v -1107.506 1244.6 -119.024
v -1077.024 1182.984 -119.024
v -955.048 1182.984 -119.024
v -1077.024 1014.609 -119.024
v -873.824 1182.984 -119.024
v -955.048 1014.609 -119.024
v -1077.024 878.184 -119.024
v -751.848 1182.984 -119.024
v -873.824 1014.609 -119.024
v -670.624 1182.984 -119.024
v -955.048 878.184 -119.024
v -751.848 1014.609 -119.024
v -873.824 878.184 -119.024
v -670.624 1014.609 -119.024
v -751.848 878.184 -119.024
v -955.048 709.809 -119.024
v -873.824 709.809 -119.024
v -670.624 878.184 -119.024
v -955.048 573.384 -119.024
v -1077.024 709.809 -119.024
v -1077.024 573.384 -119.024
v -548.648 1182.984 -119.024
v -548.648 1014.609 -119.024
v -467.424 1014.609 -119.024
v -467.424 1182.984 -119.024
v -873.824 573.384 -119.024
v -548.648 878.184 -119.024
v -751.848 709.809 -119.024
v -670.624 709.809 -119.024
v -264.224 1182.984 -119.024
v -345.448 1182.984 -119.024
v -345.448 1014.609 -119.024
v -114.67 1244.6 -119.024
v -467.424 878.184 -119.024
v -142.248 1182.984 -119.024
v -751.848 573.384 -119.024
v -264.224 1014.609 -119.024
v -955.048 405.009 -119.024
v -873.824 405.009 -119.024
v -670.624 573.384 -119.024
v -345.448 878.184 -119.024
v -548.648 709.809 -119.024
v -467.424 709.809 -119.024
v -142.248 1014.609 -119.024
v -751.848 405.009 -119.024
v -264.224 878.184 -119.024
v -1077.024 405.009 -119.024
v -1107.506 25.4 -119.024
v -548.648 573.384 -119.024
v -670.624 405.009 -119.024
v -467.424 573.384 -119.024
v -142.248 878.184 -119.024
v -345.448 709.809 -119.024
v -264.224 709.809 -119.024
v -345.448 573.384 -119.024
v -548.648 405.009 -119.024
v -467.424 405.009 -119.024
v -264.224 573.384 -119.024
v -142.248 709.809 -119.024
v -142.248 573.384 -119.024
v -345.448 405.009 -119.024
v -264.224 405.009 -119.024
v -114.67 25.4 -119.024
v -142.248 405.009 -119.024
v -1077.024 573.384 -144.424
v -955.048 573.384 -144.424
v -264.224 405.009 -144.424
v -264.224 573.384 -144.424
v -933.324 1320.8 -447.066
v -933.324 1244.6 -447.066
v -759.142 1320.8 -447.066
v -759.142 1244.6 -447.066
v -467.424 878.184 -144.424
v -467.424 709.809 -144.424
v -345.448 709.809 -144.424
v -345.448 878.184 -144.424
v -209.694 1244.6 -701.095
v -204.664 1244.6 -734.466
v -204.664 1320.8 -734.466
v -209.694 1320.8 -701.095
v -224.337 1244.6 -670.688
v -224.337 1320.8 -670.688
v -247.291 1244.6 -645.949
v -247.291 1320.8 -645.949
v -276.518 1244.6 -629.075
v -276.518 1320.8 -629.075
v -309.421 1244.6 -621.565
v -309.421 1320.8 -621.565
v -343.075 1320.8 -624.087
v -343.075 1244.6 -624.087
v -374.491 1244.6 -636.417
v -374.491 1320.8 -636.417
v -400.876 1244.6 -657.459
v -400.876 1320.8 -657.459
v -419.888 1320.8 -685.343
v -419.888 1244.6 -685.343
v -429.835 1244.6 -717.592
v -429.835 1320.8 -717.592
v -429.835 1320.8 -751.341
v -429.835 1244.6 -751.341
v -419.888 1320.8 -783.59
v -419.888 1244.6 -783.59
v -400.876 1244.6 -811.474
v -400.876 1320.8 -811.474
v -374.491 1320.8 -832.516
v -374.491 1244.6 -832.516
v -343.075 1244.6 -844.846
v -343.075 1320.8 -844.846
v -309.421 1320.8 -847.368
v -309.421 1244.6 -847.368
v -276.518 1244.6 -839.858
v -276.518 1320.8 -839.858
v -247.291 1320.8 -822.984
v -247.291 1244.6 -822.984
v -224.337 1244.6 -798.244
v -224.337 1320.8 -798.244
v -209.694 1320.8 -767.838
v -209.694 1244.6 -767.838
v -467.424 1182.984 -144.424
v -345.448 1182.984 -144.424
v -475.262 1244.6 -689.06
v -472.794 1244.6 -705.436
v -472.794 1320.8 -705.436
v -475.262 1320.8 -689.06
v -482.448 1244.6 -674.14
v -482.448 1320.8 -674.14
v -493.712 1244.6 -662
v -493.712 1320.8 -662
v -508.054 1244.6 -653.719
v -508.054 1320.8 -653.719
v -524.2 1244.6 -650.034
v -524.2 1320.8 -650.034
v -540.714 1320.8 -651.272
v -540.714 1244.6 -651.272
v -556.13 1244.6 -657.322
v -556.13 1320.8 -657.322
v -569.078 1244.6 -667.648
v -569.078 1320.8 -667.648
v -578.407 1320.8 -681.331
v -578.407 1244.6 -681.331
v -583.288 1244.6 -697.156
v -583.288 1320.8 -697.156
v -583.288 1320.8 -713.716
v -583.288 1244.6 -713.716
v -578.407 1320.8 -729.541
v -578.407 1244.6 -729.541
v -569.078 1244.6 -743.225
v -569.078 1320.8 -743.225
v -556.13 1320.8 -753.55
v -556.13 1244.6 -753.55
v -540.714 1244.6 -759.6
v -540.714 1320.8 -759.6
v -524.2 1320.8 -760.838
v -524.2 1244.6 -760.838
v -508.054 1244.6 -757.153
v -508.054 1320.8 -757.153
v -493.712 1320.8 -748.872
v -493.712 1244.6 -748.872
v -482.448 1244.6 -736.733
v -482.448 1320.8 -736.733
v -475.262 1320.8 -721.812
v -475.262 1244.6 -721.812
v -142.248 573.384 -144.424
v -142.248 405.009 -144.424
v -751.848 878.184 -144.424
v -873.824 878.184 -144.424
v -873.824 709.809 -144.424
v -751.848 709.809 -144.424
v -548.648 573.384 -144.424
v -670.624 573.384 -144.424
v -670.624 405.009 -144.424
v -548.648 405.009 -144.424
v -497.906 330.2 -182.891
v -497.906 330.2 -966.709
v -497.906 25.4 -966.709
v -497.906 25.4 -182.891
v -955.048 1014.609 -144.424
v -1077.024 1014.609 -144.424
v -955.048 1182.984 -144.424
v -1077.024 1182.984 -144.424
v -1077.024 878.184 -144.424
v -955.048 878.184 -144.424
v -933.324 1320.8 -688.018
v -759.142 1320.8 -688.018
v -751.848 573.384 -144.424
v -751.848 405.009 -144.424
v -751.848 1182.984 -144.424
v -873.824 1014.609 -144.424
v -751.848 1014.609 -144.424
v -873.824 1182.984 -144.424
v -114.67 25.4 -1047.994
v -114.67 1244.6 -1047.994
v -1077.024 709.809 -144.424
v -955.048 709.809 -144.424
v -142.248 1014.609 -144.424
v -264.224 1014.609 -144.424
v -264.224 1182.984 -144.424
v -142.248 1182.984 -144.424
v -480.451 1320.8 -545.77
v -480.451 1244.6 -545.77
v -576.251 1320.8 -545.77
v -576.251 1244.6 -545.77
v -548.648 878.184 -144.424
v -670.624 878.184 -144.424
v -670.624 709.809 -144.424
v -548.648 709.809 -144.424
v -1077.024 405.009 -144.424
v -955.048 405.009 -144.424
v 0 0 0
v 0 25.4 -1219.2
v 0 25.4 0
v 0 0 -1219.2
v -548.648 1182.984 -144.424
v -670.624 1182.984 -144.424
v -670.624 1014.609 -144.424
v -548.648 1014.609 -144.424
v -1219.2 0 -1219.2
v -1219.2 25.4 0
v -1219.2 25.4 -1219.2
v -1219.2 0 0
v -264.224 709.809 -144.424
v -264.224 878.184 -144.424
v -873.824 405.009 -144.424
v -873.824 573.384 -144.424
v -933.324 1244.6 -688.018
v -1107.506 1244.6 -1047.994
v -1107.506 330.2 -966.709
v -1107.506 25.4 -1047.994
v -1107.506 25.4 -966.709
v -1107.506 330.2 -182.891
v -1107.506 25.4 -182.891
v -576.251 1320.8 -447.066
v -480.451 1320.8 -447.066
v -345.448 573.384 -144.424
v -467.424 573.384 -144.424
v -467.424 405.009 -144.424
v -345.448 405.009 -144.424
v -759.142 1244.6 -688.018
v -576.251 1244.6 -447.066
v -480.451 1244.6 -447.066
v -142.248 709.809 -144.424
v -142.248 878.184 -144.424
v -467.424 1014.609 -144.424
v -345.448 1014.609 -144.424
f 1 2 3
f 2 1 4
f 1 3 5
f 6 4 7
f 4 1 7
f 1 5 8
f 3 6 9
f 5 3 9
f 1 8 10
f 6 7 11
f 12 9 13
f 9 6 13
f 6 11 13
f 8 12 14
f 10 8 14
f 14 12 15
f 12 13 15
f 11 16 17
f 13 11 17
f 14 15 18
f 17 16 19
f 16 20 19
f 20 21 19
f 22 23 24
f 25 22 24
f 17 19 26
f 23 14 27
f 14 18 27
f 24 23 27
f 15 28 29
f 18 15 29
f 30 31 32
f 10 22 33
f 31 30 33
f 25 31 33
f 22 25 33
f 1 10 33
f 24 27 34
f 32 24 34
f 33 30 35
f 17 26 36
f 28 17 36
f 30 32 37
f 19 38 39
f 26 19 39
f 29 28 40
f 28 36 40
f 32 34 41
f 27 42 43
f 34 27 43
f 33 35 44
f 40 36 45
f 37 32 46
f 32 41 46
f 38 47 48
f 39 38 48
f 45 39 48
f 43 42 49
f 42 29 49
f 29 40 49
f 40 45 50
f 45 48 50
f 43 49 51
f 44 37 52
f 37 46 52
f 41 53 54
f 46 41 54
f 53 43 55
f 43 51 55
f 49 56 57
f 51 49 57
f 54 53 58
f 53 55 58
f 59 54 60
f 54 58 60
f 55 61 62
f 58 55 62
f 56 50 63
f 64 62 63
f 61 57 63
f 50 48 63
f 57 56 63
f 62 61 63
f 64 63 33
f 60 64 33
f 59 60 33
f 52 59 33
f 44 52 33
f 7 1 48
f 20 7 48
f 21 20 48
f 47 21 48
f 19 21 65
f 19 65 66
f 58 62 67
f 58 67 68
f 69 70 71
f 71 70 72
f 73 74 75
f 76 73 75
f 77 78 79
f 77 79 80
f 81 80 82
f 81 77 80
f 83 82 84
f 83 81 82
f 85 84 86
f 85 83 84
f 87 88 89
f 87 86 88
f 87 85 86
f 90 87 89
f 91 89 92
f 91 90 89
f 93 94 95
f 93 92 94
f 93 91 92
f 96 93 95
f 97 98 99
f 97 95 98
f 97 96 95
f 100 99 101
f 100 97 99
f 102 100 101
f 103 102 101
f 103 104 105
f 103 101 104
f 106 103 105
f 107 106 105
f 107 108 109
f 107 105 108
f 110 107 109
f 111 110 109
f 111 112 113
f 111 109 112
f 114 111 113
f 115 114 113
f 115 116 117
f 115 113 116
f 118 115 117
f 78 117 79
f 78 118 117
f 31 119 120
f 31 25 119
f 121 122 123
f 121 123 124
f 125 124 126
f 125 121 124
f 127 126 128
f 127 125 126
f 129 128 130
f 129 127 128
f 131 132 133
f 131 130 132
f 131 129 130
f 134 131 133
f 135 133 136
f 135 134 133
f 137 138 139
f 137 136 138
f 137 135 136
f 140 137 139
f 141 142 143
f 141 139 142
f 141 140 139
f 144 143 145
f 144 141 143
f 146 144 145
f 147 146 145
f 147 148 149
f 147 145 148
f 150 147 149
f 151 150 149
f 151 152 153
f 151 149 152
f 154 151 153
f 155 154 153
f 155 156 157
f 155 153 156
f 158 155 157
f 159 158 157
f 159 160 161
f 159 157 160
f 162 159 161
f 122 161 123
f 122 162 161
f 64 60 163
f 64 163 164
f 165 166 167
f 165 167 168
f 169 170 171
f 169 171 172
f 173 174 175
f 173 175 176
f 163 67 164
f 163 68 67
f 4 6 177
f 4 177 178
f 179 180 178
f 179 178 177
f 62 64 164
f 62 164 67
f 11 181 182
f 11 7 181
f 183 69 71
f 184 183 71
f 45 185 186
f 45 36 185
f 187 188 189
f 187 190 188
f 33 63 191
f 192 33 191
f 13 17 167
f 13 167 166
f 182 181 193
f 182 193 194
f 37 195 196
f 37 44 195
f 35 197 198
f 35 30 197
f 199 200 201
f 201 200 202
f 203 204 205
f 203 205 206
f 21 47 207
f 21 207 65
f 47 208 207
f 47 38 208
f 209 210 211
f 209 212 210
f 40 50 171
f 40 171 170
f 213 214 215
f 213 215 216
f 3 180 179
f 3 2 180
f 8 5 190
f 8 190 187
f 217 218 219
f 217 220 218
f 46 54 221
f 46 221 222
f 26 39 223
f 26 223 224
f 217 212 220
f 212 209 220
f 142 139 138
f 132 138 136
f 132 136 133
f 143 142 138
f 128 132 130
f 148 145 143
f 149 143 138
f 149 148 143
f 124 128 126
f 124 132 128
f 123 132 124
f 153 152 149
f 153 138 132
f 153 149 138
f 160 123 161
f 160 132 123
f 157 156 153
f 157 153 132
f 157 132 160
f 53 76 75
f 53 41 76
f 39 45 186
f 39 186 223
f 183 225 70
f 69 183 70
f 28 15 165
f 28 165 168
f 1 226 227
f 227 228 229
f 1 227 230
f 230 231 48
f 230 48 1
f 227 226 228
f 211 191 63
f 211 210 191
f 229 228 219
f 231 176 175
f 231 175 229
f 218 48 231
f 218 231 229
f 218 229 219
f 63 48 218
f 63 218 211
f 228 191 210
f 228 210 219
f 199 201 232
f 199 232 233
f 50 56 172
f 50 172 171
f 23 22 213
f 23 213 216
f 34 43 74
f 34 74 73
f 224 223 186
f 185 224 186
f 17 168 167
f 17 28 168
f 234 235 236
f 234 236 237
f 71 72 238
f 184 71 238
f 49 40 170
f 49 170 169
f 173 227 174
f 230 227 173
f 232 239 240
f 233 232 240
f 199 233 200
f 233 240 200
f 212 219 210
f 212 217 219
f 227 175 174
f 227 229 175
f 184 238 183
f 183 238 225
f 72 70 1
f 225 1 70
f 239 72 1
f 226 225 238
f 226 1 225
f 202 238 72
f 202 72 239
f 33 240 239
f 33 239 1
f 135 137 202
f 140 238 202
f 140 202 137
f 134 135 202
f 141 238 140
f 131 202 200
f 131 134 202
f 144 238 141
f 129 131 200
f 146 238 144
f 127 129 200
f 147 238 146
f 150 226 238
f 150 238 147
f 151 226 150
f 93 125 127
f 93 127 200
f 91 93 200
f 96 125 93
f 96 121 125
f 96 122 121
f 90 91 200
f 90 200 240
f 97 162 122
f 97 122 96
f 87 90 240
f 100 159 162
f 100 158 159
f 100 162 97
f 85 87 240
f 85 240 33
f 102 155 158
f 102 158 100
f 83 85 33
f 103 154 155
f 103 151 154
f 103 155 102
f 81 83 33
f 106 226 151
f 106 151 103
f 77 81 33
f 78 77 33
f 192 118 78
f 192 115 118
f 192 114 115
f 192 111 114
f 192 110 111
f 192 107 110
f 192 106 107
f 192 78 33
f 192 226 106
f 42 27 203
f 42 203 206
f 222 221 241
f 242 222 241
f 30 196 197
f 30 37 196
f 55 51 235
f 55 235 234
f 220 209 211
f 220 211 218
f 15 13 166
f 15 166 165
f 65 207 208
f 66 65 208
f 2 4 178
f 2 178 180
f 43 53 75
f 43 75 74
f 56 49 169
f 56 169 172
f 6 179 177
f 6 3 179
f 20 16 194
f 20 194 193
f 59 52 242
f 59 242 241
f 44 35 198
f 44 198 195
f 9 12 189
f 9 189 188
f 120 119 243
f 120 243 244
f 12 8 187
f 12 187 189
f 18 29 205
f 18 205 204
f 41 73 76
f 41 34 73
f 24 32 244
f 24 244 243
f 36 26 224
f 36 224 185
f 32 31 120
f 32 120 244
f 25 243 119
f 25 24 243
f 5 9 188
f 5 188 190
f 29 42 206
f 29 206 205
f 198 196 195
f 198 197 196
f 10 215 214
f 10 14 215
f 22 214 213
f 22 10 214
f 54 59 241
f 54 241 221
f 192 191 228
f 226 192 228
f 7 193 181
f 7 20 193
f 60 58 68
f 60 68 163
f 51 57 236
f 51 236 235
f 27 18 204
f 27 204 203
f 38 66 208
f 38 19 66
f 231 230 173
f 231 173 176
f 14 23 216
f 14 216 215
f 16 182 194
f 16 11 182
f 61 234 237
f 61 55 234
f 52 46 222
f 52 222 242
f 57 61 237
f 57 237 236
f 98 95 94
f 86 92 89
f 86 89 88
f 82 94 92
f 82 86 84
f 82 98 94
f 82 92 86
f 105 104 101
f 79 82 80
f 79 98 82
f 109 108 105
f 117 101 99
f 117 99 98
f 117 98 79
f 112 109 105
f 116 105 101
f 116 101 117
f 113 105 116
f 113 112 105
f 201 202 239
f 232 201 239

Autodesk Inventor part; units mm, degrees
ref_plane "YZ Plane" through (0, 0, 0) normal (1, 0, 0) x (0, 1, 0)
ref_plane "XZ Plane" through (0, 0, 0) normal (0, 1, 0) x (-1, 0, 0)
ref_plane "XY Plane" through (0, 0, 0) normal (0, 0, 1) x (1, 0, 0)
sketch "Sketch1" plane through (0, 0, 0) normal (0, 1, 0) x (-1, 0, 0)
  line L0 (0, 0) -> (1219.2, 0)
  line L1 (1219.2, 0) -> (1219.2, -1219.2)
  line L2 (1219.2, -1219.2) -> (0, -1219.2)
  line L3 (0, -1219.2) -> (0, 0)
  dimension "d0" = 1219.2
  dimension "d1" = 1219.2
extrude "Extrusion1" add sketch "Sketch1" along normal blind 25.4
sketch "Sketch2" plane through (0, 25.4, 0) normal (0, 1, 0) x (1, 0, 0)
  line L0 (-1107.5056, 119.0242) -> (-114.6697, 119.0242)
  line L1 (-114.6697, 119.0242) -> (-114.6697, 1047.9936)
  line L2 (-114.6697, 1047.9936) -> (-1107.5056, 1047.9936)
  line L3 (-1107.5056, 1047.9936) -> (-1107.5056, 119.0242)
  point P0 (0, 0)
extrude "Extrusion2" add sketch "Sketch2" along normal blind 1219.2
sketch "Sketch3" plane through (0, 1244.6, 0) normal (0, 1, 0) x (1, 0, 0)
  line L0 (-933.3238, 447.0665) -> (-759.1421, 447.0665)
  line L1 (-759.1421, 447.0665) -> (-759.1421, 688.0179)
  line L2 (-759.1421, 688.0179) -> (-933.3238, 688.0179)
  line L3 (-933.3238, 688.0179) -> (-933.3238, 447.0665)
  line L4 (-576.2513, 447.0665) -> (-480.4513, 447.0665)
  line L5 (-480.4513, 447.0665) -> (-480.4513, 545.7695)
  line L6 (-480.4513, 545.7695) -> (-576.2513, 545.7695)
  line L7 (-576.2513, 545.7695) -> (-576.2513, 447.0665)
  circle A0 centre (-528.3513, 705.4361) radius 55.5572
  circle A1 centre (-317.8817, 734.4664) radius 113.2181
  point P0 (0, 0)
extrude "Extrusion3" add sketch "Sketch3" along normal blind 76.2
sketch "Sketch4" plane through (-1107.5056, 25.4, -119.0242) normal (0, 0, 1) x (1, 0, 0)
  line L0 (30.4818, 1157.5843) -> (152.4572, 1157.5843)
  line L1 (152.4572, 1157.5843) -> (152.4572, 989.2087)
  line L2 (152.4572, 989.2087) -> (30.4818, 989.2087)
  line L3 (30.4818, 989.2087) -> (30.4818, 1157.5843)
  line L4 (0, 1219.2) -> (992.8359, 1219.2) projected
  line L5 (0, 0) -> (0, 1219.2) projected
  line L6 (233.6818, 1157.5843) -> (355.6572, 1157.5843)
  line L7 (355.6572, 1157.5843) -> (355.6572, 989.2087)
  line L8 (355.6572, 989.2087) -> (233.6818, 989.2087)
  line L9 (233.6818, 989.2087) -> (233.6818, 1157.5843)
  line L10 (436.8818, 1157.5843) -> (558.8572, 1157.5843)
  line L11 (558.8572, 1157.5843) -> (558.8572, 989.2087)
  line L12 (558.8572, 989.2087) -> (436.8818, 989.2087)
  line L13 (436.8818, 989.2087) -> (436.8818, 1157.5843)
  line L14 (640.0818, 1157.5843) -> (762.0572, 1157.5843)
  line L15 (762.0572, 1157.5843) -> (762.0572, 989.2087)
  line L16 (762.0572, 989.2087) -> (640.0818, 989.2087)
  line L17 (640.0818, 989.2087) -> (640.0818, 1157.5843)
  line L18 (843.2818, 1157.5843) -> (965.2572, 1157.5843)
  line L19 (965.2572, 1157.5843) -> (965.2572, 989.2087)
  line L20 (965.2572, 989.2087) -> (843.2818, 989.2087)
  line L21 (843.2818, 989.2087) -> (843.2818, 1157.5843)
  line L22 (30.4818, 852.7843) -> (152.4572, 852.7843)
  line L23 (152.4572, 852.7843) -> (152.4572, 684.4087)
  line L24 (152.4572, 684.4087) -> (30.4818, 684.4087)
  line L25 (30.4818, 684.4087) -> (30.4818, 852.7843)
  line L26 (233.6818, 852.7843) -> (355.6572, 852.7843)
  line L27 (355.6572, 852.7843) -> (355.6572, 684.4087)
  line L28 (355.6572, 684.4087) -> (233.6818, 684.4087)
  line L29 (233.6818, 684.4087) -> (233.6818, 852.7843)
  line L30 (436.8818, 852.7843) -> (558.8572, 852.7843)
  line L31 (558.8572, 852.7843) -> (558.8572, 684.4087)
  line L32 (558.8572, 684.4087) -> (436.8818, 684.4087)
  line L33 (436.8818, 684.4087) -> (436.8818, 852.7843)
  line L34 (640.0818, 852.7843) -> (762.0572, 852.7843)
  line L35 (762.0572, 852.7843) -> (762.0572, 684.4087)
  line L36 (762.0572, 684.4087) -> (640.0818, 684.4087)
  line L37 (640.0818, 684.4087) -> (640.0818, 852.7843)
  line L38 (843.2818, 852.7843) -> (965.2572, 852.7843)
  line L39 (965.2572, 852.7843) -> (965.2572, 684.4087)
  line L40 (965.2572, 684.4087) -> (843.2818, 684.4087)
  line L41 (843.2818, 684.4087) -> (843.2818, 852.7843)
  line L42 (30.4818, 547.9843) -> (152.4572, 547.9843)
  line L43 (152.4572, 547.9843) -> (152.4572, 379.6087)
  line L44 (152.4572, 379.6087) -> (30.4818, 379.6087)
  line L45 (30.4818, 379.6087) -> (30.4818, 547.9843)
  line L46 (233.6818, 547.9843) -> (355.6572, 547.9843)
  line L47 (355.6572, 547.9843) -> (355.6572, 379.6087)
  line L48 (355.6572, 379.6087) -> (233.6818, 379.6087)
  line L49 (233.6818, 379.6087) -> (233.6818, 547.9843)
  line L50 (436.8818, 547.9843) -> (558.8572, 547.9843)
  line L51 (558.8572, 547.9843) -> (558.8572, 379.6087)
  line L52 (558.8572, 379.6087) -> (436.8818, 379.6087)
  line L53 (436.8818, 379.6087) -> (436.8818, 547.9843)
  line L54 (640.0818, 547.9843) -> (762.0572, 547.9843)
  line L55 (762.0572, 547.9843) -> (762.0572, 379.6087)
  line L56 (762.0572, 379.6087) -> (640.0818, 379.6087)
  line L57 (640.0818, 379.6087) -> (640.0818, 547.9843)
  line L58 (843.2818, 547.9843) -> (965.2572, 547.9843)
  line L59 (965.2572, 547.9843) -> (965.2572, 379.6087)
  line L60 (965.2572, 379.6087) -> (843.2818, 379.6087)
  line L61 (843.2818, 379.6087) -> (843.2818, 547.9843)
  point P0 (1107.5056, -25.4)
  dimension "d10" = 203.2
  dimension "d13" = 304.8
extrude "Extrusion4" cut sketch "Sketch4" against normal blind 25.4
sketch "Sketch5" plane through (-1107.5056, 25.4, -1047.9936) normal (-1, 0, 0) x (0, 0, 1)
  line L0 (81.2848, 304.8) -> (865.1027, 304.8)
  line L1 (865.1027, 304.8) -> (865.1027, 0)
  line L2 (865.1027, 0) -> (81.2848, 0)
  line L3 (81.2848, 0) -> (81.2848, 304.8)
  line L4 (-171.2064, 0) -> (1047.9936, 0) projected
  point P0 (1047.9936, -25.4)
  dimension "d18" = 0
  dimension "d19" = 304.8
extrude "Extrusion5" cut sketch "Sketch5" against normal blind 609.6
equation "\"d1\" = d0"
properties part number "apartment_1" material "Wood (Oak)"
